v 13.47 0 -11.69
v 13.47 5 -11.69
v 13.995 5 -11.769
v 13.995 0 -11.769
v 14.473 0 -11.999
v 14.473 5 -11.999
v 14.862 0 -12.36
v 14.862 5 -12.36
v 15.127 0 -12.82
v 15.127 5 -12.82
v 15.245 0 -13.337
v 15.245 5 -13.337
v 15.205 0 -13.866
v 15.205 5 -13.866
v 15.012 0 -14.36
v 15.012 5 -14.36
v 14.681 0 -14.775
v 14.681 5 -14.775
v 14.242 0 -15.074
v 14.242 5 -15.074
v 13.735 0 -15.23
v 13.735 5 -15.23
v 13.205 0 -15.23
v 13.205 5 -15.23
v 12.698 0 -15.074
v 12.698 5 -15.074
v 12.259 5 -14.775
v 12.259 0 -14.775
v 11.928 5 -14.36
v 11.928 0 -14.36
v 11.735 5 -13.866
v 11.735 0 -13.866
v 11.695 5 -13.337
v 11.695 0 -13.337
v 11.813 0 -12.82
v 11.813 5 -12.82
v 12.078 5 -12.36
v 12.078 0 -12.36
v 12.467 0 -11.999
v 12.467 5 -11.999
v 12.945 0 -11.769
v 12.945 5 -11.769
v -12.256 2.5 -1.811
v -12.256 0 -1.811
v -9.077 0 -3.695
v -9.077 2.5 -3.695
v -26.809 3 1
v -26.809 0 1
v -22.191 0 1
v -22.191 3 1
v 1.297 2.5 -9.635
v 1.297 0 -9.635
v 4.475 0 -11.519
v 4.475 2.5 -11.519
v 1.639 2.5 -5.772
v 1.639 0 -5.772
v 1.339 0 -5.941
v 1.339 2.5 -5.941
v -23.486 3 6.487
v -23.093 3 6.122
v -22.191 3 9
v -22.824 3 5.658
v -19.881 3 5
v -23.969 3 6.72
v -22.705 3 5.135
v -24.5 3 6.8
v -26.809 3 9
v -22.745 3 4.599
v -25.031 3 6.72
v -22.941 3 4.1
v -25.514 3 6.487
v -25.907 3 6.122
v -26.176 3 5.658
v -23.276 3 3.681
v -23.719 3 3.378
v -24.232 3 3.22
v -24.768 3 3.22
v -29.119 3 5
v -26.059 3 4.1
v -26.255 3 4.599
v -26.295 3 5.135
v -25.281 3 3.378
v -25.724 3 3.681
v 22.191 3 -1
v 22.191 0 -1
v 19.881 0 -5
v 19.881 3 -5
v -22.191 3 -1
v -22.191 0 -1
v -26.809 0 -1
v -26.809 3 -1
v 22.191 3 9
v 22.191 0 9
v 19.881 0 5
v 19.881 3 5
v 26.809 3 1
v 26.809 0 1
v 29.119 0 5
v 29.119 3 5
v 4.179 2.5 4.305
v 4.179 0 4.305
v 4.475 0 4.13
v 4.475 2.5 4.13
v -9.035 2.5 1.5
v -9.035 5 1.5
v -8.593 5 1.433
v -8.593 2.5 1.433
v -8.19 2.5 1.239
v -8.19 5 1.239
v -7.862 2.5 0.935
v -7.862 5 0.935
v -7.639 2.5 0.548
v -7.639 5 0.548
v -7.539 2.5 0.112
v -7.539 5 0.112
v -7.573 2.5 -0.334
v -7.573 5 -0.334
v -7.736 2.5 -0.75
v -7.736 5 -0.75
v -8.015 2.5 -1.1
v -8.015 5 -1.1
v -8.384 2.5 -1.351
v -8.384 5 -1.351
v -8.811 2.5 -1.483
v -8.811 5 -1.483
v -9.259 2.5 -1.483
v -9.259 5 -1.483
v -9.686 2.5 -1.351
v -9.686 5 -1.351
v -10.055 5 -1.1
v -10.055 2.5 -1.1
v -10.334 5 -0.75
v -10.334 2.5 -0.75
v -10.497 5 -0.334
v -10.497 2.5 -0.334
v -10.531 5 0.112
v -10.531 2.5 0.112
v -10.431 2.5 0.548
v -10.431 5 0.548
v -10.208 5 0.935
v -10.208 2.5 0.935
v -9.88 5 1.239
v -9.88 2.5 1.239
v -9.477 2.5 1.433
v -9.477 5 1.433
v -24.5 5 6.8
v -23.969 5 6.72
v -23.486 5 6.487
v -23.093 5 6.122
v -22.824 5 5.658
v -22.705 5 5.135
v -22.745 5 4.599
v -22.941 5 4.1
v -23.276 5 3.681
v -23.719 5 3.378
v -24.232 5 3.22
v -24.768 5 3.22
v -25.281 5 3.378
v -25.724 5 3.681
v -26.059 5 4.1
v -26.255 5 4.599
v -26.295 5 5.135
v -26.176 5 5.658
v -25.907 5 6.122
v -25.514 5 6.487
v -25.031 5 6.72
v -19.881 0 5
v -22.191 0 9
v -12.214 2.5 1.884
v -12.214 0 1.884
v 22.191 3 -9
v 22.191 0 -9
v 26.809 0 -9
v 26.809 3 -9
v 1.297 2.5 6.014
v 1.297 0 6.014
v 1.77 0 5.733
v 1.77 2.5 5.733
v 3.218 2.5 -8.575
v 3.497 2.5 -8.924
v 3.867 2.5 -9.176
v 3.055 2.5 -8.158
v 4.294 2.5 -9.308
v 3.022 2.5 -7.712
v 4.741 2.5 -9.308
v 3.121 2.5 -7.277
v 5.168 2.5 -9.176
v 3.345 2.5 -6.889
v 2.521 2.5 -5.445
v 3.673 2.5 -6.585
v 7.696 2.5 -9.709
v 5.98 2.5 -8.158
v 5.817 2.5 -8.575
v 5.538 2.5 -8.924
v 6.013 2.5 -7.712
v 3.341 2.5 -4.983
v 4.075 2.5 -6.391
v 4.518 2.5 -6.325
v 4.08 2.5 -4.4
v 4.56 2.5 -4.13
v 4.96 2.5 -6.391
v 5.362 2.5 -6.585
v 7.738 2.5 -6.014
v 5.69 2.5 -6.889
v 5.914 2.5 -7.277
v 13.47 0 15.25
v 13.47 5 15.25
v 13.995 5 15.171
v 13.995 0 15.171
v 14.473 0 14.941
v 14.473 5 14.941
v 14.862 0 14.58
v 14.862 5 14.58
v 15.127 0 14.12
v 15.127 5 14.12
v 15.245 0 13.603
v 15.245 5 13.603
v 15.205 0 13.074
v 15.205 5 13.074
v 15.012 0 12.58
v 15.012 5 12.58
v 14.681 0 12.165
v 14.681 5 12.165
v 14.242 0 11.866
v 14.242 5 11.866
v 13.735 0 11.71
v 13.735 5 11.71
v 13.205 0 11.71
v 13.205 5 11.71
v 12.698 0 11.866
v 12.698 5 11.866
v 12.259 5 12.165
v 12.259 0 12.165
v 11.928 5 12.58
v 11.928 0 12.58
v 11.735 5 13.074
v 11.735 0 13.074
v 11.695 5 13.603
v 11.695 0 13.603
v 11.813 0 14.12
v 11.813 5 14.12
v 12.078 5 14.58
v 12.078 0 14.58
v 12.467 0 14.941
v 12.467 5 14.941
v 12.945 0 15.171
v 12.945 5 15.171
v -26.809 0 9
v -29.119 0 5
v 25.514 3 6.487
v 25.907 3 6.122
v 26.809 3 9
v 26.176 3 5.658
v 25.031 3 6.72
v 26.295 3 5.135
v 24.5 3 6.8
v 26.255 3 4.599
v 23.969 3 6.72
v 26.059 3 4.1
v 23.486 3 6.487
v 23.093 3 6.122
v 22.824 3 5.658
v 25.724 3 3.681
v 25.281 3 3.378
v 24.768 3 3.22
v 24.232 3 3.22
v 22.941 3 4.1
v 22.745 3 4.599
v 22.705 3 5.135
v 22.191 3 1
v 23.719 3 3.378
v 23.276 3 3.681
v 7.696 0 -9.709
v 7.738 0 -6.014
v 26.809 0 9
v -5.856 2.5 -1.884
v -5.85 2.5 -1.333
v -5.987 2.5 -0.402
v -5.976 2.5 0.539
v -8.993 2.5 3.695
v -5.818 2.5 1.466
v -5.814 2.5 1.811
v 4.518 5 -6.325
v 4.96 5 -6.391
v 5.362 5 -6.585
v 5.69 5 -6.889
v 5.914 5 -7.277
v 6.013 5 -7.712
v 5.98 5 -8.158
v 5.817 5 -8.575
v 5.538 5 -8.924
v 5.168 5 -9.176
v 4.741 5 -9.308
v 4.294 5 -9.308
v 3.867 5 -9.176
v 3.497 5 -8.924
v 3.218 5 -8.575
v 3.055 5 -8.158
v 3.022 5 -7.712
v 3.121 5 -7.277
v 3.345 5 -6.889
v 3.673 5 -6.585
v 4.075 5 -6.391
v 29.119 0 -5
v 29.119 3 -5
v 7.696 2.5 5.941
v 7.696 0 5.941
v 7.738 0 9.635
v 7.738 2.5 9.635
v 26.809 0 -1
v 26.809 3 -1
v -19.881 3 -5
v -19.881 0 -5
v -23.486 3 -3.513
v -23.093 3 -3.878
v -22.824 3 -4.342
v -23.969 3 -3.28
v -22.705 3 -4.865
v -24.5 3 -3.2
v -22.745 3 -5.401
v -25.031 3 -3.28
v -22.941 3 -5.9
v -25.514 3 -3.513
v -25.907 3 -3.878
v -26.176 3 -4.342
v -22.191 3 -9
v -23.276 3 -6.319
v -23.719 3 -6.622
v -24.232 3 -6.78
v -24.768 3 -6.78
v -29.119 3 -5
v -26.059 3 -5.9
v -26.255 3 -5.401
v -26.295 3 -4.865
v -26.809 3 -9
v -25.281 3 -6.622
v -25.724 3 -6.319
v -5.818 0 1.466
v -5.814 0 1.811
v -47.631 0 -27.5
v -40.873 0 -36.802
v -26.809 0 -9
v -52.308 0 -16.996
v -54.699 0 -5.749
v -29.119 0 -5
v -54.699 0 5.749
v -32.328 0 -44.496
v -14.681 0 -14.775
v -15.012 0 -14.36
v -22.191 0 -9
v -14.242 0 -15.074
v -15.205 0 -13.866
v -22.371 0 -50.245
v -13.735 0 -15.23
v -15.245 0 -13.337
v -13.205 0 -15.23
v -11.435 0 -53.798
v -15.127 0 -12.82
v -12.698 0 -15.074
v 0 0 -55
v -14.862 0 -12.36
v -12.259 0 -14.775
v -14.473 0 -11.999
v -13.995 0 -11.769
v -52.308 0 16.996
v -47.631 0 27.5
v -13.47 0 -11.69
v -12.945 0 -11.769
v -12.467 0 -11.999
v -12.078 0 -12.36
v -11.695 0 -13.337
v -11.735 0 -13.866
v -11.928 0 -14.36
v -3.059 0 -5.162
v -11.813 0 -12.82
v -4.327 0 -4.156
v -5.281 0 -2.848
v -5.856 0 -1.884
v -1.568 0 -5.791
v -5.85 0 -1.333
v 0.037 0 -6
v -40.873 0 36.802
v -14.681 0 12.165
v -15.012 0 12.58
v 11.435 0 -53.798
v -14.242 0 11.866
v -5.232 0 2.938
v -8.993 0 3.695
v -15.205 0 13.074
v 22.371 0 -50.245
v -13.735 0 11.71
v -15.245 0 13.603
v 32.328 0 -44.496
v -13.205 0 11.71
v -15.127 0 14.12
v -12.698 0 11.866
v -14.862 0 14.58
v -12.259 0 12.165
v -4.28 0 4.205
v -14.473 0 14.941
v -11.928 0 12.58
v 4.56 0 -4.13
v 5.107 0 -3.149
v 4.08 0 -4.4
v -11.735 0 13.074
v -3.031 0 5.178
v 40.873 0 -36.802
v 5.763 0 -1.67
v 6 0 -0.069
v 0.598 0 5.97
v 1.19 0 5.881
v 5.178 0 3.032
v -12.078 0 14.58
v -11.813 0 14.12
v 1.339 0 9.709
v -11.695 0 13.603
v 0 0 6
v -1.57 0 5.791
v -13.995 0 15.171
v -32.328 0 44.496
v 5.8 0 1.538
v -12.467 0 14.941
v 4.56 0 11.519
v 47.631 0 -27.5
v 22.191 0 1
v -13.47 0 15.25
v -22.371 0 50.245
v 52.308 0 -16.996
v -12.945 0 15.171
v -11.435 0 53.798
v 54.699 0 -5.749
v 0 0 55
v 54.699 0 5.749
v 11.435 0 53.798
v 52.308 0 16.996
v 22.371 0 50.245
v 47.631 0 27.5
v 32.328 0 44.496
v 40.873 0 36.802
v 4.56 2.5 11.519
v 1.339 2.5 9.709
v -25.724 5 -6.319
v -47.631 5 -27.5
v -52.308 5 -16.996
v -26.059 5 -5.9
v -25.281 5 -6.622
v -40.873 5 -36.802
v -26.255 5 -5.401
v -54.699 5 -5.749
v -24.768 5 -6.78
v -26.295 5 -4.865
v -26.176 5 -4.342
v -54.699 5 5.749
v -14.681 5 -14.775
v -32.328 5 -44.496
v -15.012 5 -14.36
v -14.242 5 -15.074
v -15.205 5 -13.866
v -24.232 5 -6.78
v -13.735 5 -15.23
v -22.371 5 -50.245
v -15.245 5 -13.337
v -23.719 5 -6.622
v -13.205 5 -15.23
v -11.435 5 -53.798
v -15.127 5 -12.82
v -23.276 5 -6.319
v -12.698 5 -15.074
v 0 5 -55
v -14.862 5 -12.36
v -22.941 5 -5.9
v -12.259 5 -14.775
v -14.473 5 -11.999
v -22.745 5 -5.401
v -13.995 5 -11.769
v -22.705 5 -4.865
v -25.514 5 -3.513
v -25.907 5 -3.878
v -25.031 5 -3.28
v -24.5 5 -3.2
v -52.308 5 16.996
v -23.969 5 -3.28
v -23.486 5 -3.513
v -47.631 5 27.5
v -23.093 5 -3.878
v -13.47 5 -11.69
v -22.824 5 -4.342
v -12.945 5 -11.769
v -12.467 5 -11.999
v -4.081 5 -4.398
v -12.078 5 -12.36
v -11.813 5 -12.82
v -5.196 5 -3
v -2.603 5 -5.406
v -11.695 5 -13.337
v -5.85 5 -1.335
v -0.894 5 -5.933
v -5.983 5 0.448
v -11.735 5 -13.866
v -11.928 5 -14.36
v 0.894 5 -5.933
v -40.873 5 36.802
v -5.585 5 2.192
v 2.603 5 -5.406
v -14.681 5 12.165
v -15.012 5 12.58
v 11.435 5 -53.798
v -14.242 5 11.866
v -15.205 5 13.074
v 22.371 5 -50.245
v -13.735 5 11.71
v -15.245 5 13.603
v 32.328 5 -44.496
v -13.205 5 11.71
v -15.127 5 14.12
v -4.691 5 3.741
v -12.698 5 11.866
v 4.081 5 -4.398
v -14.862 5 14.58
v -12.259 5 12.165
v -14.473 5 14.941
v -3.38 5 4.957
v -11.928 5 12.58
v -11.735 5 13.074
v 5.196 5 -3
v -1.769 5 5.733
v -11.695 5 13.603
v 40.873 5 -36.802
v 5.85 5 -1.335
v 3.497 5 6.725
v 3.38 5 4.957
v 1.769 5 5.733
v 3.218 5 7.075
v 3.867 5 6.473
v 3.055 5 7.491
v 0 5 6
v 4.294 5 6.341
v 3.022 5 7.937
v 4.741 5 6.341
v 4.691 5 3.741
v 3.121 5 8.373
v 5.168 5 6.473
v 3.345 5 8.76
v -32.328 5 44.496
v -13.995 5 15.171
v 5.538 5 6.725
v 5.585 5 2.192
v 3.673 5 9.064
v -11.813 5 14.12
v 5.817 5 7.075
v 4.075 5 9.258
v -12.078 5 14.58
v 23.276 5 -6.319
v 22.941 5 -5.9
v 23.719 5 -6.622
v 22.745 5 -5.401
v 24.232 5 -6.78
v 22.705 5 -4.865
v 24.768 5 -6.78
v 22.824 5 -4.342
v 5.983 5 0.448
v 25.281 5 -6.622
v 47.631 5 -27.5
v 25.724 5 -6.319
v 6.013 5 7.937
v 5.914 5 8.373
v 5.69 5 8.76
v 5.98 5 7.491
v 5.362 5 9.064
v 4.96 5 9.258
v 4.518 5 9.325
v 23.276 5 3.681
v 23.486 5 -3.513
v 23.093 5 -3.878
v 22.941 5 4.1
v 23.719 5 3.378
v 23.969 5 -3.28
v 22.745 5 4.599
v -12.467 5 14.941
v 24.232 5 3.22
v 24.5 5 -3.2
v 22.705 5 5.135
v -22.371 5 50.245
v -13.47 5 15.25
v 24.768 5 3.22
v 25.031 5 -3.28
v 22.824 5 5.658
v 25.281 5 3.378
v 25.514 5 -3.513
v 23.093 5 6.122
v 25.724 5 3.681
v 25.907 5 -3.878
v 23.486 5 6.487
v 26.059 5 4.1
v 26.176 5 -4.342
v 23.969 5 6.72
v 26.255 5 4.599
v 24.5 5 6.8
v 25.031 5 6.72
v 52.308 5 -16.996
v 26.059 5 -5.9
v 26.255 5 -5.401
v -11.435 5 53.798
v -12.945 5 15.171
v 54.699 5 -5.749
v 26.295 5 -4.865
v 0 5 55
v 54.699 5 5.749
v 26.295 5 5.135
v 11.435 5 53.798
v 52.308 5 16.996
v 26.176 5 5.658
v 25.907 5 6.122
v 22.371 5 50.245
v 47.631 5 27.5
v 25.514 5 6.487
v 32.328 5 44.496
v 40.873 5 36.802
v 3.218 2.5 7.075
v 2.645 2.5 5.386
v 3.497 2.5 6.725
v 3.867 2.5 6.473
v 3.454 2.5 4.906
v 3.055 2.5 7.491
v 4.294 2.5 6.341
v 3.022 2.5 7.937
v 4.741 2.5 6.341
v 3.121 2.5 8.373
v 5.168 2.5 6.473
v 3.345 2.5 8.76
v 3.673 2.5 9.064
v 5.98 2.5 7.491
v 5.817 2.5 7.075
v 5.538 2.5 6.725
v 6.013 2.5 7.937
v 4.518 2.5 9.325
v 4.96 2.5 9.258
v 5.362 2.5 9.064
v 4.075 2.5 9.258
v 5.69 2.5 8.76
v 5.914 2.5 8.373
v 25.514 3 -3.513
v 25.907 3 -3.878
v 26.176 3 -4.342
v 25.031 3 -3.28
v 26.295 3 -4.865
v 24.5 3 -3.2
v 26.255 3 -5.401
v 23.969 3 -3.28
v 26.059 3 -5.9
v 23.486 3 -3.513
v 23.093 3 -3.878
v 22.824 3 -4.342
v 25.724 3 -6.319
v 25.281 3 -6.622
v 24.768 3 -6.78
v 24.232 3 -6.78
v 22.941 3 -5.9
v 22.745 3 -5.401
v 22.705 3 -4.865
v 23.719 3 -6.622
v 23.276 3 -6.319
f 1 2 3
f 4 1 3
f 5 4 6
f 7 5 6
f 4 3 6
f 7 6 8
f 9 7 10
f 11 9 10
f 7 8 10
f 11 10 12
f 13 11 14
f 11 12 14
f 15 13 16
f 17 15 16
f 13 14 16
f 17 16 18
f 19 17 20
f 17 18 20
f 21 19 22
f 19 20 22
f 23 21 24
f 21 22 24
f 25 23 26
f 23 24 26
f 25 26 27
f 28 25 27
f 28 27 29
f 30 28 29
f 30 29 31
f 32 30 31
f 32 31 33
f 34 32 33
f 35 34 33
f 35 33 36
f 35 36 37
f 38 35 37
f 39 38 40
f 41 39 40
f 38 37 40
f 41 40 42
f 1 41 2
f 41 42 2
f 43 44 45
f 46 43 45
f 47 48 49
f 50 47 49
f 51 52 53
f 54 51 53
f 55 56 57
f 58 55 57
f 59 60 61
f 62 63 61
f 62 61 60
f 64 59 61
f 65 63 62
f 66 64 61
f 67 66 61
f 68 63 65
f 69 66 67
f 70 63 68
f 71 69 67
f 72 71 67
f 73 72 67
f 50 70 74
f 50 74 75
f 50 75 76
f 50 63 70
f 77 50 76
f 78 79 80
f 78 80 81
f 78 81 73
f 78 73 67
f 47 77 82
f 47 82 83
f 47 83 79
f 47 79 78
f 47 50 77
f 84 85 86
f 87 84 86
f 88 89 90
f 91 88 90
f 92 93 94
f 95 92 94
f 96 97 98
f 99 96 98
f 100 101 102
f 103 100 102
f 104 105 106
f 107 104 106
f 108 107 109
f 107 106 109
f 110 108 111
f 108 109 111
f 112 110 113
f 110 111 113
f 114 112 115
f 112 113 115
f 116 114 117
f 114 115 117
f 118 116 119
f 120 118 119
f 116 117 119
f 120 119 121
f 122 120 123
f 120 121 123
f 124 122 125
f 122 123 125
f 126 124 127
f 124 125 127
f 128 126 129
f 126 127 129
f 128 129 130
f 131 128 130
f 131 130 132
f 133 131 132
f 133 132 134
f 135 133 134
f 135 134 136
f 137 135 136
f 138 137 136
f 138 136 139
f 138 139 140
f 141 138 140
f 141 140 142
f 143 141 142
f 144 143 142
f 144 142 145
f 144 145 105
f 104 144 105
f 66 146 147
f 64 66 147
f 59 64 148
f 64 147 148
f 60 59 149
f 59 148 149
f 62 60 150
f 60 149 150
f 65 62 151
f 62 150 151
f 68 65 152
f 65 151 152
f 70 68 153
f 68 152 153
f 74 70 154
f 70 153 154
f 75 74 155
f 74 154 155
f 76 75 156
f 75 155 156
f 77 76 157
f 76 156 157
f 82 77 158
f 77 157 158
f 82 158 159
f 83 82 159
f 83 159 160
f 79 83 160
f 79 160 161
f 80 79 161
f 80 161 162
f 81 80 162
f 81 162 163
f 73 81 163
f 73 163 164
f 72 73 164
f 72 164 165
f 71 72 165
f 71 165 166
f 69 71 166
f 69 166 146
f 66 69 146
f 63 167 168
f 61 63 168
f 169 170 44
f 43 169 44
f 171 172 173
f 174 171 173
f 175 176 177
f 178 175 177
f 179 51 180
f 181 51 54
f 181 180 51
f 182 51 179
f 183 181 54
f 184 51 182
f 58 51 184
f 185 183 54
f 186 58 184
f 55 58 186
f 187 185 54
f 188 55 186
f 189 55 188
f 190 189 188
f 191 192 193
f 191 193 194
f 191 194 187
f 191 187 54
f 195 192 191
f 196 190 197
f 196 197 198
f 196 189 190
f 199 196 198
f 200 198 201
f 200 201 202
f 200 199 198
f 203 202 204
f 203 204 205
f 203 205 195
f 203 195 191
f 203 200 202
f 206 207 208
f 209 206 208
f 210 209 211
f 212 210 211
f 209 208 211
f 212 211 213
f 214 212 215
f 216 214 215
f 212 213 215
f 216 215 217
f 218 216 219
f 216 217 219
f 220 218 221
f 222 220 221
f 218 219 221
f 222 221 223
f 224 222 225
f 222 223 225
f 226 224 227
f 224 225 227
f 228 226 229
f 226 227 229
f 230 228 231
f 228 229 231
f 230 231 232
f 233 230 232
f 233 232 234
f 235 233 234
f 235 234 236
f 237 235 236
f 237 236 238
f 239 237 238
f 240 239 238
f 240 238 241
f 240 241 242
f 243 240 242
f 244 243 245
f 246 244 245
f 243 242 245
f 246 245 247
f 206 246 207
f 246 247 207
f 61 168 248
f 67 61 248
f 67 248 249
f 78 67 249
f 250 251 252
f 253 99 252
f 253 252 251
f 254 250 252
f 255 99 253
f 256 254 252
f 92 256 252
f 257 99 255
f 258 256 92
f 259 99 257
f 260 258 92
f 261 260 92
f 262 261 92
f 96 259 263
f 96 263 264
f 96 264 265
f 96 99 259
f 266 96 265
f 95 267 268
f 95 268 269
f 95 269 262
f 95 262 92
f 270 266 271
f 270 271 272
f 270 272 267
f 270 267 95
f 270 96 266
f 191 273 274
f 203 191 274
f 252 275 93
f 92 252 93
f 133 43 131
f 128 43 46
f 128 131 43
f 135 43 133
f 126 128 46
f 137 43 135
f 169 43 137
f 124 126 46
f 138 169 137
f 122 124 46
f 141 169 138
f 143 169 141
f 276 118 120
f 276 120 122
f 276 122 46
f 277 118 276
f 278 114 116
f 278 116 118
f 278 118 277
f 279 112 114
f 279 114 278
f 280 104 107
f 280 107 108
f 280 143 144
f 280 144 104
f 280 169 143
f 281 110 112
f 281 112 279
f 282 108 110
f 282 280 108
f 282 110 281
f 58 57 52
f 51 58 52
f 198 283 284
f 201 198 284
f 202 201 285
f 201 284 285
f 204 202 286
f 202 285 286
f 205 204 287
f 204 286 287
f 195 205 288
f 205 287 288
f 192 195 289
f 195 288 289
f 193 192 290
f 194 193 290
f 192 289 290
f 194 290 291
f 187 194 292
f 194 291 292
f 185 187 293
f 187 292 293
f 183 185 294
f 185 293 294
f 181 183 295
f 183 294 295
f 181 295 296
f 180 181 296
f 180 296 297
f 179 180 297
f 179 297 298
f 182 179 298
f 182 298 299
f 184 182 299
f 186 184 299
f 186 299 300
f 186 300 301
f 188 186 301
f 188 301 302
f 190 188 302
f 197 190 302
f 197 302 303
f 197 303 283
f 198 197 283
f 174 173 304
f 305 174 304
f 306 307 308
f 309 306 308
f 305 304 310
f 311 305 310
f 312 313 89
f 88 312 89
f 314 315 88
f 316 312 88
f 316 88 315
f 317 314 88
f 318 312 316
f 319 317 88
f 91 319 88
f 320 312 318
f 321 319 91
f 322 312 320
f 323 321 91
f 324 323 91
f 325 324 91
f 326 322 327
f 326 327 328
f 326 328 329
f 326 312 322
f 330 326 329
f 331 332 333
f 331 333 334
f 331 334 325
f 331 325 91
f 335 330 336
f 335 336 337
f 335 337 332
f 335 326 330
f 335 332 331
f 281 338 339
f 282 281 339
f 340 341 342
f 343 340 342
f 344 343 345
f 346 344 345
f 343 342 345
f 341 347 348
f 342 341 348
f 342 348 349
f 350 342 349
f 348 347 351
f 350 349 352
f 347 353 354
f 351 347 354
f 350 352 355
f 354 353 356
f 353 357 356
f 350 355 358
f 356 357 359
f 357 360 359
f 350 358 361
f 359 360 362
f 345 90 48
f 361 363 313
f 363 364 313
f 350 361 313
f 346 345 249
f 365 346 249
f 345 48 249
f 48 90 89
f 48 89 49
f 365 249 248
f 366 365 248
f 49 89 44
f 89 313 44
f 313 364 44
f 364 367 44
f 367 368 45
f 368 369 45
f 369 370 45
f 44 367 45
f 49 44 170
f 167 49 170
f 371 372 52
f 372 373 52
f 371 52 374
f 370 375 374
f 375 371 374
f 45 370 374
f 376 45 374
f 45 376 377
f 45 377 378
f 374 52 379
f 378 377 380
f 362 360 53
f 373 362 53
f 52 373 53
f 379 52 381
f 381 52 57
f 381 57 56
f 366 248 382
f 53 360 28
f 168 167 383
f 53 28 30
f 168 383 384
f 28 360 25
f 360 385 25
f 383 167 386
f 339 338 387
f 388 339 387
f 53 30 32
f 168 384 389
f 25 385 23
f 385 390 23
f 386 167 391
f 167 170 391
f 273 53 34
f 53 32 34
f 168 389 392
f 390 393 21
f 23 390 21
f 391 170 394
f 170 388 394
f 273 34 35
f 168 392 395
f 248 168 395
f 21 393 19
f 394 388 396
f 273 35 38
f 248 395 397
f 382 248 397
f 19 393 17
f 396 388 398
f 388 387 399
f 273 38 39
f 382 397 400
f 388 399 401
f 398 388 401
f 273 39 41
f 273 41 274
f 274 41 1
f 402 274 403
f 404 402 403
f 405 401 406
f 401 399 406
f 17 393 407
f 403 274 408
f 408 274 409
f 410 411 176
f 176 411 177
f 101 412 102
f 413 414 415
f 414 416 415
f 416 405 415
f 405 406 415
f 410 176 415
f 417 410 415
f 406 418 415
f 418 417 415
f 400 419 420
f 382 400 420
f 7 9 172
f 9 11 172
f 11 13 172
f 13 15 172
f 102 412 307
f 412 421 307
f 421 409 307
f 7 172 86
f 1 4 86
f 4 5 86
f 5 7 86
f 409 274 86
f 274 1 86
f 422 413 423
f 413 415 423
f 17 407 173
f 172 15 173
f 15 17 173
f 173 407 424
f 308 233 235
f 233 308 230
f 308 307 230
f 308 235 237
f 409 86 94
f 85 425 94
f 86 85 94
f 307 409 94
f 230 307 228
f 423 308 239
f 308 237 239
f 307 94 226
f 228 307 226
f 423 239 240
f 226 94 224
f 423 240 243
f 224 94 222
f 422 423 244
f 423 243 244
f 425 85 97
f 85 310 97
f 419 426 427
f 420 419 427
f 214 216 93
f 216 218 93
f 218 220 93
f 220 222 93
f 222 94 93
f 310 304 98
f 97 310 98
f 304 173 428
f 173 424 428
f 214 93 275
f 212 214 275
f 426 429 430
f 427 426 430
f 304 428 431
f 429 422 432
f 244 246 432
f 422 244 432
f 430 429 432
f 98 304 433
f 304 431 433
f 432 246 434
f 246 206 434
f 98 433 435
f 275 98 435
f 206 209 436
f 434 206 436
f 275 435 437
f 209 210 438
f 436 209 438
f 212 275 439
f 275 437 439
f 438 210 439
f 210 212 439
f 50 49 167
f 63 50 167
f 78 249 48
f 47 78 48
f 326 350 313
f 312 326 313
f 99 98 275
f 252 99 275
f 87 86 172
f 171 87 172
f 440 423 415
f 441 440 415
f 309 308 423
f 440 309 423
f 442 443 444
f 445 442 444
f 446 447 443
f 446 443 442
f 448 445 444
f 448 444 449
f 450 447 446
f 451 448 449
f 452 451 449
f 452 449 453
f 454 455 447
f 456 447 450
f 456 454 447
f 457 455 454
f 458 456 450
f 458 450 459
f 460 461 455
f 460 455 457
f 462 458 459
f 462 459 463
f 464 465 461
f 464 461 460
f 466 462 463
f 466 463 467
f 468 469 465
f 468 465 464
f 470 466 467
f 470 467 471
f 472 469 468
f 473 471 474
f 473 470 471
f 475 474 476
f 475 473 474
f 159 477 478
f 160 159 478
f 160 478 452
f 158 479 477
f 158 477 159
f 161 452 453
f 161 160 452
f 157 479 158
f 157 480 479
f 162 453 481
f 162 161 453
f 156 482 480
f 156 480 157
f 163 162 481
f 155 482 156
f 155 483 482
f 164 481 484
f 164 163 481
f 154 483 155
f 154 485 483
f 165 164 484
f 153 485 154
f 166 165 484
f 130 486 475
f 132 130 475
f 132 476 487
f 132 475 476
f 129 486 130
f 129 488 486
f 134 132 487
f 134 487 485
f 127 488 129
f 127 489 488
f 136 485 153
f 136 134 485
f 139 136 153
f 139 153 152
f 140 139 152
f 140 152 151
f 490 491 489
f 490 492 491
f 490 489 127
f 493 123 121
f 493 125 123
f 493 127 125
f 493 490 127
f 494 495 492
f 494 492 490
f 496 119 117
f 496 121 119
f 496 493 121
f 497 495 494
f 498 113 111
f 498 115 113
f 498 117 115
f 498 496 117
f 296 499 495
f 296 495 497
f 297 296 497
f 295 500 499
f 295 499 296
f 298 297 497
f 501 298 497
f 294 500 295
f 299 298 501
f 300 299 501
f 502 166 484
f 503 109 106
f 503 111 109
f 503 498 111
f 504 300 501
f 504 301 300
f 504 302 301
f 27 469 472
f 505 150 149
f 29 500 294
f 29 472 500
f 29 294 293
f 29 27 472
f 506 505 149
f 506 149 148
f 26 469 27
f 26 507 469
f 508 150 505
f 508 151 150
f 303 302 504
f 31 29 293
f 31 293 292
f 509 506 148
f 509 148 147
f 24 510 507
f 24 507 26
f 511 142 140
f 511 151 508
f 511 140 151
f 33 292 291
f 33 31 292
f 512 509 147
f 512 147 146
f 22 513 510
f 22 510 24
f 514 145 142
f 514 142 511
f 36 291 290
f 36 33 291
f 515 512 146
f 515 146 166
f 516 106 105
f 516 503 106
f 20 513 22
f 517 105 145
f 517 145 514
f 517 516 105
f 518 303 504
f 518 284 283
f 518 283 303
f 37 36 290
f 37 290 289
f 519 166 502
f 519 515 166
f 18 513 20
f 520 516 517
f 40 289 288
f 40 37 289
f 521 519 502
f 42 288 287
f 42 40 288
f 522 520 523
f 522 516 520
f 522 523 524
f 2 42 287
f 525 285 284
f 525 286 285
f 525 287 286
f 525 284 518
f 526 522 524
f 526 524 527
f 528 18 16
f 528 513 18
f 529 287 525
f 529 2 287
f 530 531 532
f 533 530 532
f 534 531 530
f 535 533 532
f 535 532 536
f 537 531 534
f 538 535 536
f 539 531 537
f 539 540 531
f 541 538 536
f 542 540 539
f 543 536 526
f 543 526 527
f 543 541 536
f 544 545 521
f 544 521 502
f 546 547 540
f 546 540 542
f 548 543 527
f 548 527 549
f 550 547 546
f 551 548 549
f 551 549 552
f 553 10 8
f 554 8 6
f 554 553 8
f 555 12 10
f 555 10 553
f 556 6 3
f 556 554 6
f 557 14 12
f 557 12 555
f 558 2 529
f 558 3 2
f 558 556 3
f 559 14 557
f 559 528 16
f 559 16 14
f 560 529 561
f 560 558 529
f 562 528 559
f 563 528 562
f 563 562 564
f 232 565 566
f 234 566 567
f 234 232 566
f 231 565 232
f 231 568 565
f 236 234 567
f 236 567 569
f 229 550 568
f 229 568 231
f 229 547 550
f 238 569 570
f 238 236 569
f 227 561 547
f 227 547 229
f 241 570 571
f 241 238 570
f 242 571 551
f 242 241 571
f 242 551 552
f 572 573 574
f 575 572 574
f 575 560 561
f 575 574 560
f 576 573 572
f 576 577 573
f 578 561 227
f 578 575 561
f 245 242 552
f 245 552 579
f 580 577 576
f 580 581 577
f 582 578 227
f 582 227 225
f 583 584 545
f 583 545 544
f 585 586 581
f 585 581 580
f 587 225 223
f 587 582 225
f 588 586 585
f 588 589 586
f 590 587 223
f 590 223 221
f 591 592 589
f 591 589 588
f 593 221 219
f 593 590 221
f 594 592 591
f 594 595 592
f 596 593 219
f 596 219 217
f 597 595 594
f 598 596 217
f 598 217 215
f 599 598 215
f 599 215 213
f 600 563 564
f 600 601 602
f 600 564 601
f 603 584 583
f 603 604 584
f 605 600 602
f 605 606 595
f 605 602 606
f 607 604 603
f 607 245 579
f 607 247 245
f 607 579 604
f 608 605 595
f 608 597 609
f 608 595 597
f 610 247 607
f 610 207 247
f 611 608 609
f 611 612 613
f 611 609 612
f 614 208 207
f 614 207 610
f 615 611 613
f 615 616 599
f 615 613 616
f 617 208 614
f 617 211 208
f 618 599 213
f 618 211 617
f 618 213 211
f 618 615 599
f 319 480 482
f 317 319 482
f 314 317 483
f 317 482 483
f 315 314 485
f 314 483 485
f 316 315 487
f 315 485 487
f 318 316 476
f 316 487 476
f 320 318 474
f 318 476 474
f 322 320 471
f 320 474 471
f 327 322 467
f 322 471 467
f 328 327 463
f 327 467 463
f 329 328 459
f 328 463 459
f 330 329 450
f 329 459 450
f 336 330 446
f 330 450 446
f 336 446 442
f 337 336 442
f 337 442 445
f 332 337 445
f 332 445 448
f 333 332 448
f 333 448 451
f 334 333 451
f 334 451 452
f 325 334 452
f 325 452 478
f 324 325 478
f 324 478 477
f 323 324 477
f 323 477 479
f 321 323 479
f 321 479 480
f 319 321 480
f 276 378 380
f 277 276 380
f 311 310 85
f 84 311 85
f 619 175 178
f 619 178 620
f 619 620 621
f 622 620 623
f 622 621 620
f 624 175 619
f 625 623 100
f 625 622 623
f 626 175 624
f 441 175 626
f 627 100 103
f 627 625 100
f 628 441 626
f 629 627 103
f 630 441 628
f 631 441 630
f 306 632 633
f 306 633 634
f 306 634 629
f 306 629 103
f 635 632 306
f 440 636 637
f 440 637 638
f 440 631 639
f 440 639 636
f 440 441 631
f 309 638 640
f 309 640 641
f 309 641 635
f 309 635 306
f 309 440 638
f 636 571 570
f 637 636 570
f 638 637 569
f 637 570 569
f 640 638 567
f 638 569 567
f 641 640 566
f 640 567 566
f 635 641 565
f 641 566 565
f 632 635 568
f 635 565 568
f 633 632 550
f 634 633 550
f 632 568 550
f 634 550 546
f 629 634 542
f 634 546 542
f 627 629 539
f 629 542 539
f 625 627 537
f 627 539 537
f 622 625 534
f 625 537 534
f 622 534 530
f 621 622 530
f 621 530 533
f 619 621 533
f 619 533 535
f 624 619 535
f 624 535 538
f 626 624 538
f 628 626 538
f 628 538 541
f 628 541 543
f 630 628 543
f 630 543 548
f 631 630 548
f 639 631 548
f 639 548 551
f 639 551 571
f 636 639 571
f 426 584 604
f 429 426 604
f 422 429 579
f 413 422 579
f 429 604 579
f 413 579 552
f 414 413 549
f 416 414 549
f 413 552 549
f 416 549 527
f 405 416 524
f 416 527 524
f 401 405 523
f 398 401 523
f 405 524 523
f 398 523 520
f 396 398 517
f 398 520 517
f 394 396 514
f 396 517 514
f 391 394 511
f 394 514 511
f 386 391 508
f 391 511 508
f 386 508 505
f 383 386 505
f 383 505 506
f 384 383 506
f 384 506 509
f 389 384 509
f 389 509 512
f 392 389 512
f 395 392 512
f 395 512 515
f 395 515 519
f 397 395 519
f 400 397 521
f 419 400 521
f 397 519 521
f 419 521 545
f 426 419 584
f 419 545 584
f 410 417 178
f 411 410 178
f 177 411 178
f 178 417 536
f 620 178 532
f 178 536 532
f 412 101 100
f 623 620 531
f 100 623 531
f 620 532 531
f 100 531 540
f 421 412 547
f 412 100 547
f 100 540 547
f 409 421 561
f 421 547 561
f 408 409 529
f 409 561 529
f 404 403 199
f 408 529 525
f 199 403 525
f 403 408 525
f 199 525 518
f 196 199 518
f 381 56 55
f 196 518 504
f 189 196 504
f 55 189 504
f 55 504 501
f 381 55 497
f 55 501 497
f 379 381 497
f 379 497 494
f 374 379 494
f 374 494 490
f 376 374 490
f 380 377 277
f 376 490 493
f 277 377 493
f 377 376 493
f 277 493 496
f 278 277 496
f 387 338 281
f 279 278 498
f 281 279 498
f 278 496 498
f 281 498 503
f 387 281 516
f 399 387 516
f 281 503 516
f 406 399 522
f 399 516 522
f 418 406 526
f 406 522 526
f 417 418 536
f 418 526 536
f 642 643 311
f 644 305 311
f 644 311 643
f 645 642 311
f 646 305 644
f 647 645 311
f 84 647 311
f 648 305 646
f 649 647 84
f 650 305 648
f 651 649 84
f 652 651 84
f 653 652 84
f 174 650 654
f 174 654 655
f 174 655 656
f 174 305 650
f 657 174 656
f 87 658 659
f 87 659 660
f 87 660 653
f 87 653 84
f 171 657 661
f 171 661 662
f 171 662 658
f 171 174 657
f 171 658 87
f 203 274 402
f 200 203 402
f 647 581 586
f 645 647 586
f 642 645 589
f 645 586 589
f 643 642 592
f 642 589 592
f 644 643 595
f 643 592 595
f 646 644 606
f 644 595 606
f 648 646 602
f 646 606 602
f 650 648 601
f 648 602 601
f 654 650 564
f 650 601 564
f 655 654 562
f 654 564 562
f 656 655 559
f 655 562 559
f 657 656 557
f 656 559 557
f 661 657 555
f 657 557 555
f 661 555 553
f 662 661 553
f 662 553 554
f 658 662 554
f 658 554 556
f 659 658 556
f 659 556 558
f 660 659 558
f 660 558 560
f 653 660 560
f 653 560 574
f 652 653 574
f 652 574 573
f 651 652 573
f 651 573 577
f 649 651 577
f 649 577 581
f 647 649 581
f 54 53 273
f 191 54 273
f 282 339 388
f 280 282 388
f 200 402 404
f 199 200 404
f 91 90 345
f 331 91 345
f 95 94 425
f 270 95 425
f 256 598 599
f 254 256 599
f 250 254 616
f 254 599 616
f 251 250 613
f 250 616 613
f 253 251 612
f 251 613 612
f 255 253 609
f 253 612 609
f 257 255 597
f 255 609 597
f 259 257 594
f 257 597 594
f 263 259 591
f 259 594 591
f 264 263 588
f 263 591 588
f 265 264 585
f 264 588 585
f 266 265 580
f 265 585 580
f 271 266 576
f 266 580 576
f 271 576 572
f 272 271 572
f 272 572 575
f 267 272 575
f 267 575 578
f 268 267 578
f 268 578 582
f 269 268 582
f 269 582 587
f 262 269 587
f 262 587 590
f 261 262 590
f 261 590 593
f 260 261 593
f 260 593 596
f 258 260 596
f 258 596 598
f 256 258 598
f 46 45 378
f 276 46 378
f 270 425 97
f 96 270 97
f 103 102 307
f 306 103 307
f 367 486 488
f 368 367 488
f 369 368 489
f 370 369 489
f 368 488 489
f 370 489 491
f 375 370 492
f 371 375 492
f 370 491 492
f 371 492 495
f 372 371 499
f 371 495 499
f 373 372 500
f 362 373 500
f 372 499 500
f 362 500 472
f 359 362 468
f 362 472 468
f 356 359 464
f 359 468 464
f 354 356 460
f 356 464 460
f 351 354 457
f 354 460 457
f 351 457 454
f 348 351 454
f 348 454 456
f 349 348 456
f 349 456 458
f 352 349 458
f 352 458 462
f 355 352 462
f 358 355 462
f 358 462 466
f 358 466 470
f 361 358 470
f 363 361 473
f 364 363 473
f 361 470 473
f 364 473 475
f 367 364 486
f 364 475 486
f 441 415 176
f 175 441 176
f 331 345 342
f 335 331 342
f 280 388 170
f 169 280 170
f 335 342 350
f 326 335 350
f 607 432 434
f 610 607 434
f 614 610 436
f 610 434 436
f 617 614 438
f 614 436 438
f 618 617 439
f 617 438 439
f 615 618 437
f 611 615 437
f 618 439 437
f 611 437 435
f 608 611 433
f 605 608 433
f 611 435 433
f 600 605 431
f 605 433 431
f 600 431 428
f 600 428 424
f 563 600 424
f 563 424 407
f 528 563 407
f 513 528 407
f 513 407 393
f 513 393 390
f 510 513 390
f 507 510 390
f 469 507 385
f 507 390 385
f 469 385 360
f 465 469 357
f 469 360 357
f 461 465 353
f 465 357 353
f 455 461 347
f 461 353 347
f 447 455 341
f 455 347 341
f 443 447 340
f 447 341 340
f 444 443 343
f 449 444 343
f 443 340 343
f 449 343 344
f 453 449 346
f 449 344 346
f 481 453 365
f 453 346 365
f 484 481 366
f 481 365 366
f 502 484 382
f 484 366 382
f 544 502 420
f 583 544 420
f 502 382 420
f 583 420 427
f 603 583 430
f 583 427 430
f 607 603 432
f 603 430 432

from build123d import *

# Parameters (mm, degrees)
SKETCH1_R           = 55
BOSS_EXTRUDE1_DEPTH = 5
SKETCH2_R           = 6
SKETCH2_R_2         = 1.78
CUT_EXTRUDE1_DEPTH  = 5
SKETCH3_R           = 1.5
CUT_EXTRUDE2_DEPTH  = 5
CUT_EXTRUDE5_DEPTH  = 2.5
SKETCH6_R           = 1.8
CUT_EXTRUDE6_DEPTH  = 10
CUT_EXTRUDE7_DEPTH  = 3


with BuildPart() as part:
    # Sketch1 → Boss-Extrude1 (new body)
    with BuildSketch(Plane(origin=(0, 0, 0), x_dir=(1, 0, 0), z_dir=(0, 1, 0))):
        with Locations(Location((0, 0, 0), (0, 0, 270))):
            Circle(SKETCH1_R)
    extrude(amount=BOSS_EXTRUDE1_DEPTH)

    # Sketch2 → Cut-Extrude1 (cut)
    with BuildSketch(Plane(origin=(0, 5, 0), x_dir=(1, 0, 0), z_dir=(0, 1, 0))):
        with Locations(Location((0, 0, 0), (0, 0, 270))):
            Circle(SKETCH2_R)
        with Locations(Location((-13.47, -13.47, 0), (0, 0, 270))):
            Circle(SKETCH2_R_2)
        with Locations(Location((-13.47, 13.47, 0), (0, 0, 270))):
            Circle(SKETCH2_R_2)
        with Locations(Location((13.47, 13.47, 0), (0, 0, 270))):
            Circle(SKETCH2_R_2)
        with Locations(Location((13.47, -13.47, 0), (0, 0, 270))):
            Circle(SKETCH2_R_2)
    extrude(amount=-CUT_EXTRUDE1_DEPTH, mode=Mode.SUBTRACT)

    # Sketch3 → Cut-Extrude2 (cut)
    with BuildSketch(Plane(origin=(0, 5, 0), x_dir=(1, 0, 0), z_dir=(0, 1, 0))):
        with Locations(Location((4.5175, -7.824539523, 0), (0, 0, 270))):
            Circle(SKETCH3_R)
        with Locations(Location((-9.035, 0, 0), (0, 0, 270))):
            Circle(SKETCH3_R)
        with Locations(Location((4.5175, 7.824539523, 0), (0, 0, 270))):
            Circle(SKETCH3_R)
    extrude(amount=-CUT_EXTRUDE2_DEPTH, mode=Mode.SUBTRACT)

    # Sketch5 → Cut-Extrude5 (cut)
    with BuildSketch(Plane.XZ):
        Polygon((4.475281589, -11.519340051), (7.696181913, -9.708502003), (7.738400324, -6.013701476), (4.559718411, -4.129738996), (1.338818087, -5.940577043), (1.296599676, -9.635377571), align=None)
        Polygon((7.738400324, 9.635377571), (4.559718411, 11.519340051), (1.338818087, 9.708502003), (1.296599676, 6.013701476), (4.475281589, 4.129738996), (7.696181913, 5.940577043), align=None)
        Polygon((-12.213681913, 1.88396248), (-12.255900324, -1.810838048), (-9.077218411, -3.694800528), (-5.856318087, -1.88396248), (-5.814099676, 1.810838048), (-8.992781589, 3.694800528), align=None)
    extrude(amount=-CUT_EXTRUDE5_DEPTH, mode=Mode.SUBTRACT)

    # Sketch6 → Cut-Extrude6 (cut)
    with BuildSketch(Plane(origin=(0, 5, 0), x_dir=(1, 0, 0), z_dir=(0, 1, 0))):
        with Locations(Location((24.5, -5, 0), (0, 0, 270))):
            Circle(SKETCH6_R)
        with Locations(Location((-24.5, -5, 0), (0, 0, 270))):
            Circle(SKETCH6_R)
        with Locations(Location((-24.5, 5, 0), (0, 0, 270))):
            Circle(SKETCH6_R)
        with Locations(Location((24.5, 5, 0), (0, 0, 270))):
            Circle(SKETCH6_R)
    extrude(amount=-CUT_EXTRUDE6_DEPTH, mode=Mode.SUBTRACT)

    # Sketch7 → Cut-Extrude7 (cut)
    with BuildSketch(Plane(origin=(0, 0, 0), x_dir=(-1, 0, 0), z_dir=(0, -1, 0))):
        Polygon((26.809401077, -1), (22.190598923, -1), (19.881197846, -5), (22.190598923, -9), (26.809401077, -9), (29.118802154, -5), align=None)
        Polygon((-29.118802154, -5), (-26.809401077, -9), (-22.190598923, -9), (-19.881197846, -5), (-22.190598923, -1), (-26.809401077, -1), align=None)
        Polygon((26.809401077, 9), (22.190598923, 9), (19.881197846, 5), (22.190598923, 1), (26.809401077, 1), (29.118802154, 5), align=None)
        Polygon((-22.190598923, 9), (-26.809401077, 9), (-29.118802154, 5), (-26.809401077, 1), (-22.190598923, 1), (-19.881197846, 5), align=None)
    extrude(amount=-CUT_EXTRUDE7_DEPTH, mode=Mode.SUBTRACT)


solid = part.part
